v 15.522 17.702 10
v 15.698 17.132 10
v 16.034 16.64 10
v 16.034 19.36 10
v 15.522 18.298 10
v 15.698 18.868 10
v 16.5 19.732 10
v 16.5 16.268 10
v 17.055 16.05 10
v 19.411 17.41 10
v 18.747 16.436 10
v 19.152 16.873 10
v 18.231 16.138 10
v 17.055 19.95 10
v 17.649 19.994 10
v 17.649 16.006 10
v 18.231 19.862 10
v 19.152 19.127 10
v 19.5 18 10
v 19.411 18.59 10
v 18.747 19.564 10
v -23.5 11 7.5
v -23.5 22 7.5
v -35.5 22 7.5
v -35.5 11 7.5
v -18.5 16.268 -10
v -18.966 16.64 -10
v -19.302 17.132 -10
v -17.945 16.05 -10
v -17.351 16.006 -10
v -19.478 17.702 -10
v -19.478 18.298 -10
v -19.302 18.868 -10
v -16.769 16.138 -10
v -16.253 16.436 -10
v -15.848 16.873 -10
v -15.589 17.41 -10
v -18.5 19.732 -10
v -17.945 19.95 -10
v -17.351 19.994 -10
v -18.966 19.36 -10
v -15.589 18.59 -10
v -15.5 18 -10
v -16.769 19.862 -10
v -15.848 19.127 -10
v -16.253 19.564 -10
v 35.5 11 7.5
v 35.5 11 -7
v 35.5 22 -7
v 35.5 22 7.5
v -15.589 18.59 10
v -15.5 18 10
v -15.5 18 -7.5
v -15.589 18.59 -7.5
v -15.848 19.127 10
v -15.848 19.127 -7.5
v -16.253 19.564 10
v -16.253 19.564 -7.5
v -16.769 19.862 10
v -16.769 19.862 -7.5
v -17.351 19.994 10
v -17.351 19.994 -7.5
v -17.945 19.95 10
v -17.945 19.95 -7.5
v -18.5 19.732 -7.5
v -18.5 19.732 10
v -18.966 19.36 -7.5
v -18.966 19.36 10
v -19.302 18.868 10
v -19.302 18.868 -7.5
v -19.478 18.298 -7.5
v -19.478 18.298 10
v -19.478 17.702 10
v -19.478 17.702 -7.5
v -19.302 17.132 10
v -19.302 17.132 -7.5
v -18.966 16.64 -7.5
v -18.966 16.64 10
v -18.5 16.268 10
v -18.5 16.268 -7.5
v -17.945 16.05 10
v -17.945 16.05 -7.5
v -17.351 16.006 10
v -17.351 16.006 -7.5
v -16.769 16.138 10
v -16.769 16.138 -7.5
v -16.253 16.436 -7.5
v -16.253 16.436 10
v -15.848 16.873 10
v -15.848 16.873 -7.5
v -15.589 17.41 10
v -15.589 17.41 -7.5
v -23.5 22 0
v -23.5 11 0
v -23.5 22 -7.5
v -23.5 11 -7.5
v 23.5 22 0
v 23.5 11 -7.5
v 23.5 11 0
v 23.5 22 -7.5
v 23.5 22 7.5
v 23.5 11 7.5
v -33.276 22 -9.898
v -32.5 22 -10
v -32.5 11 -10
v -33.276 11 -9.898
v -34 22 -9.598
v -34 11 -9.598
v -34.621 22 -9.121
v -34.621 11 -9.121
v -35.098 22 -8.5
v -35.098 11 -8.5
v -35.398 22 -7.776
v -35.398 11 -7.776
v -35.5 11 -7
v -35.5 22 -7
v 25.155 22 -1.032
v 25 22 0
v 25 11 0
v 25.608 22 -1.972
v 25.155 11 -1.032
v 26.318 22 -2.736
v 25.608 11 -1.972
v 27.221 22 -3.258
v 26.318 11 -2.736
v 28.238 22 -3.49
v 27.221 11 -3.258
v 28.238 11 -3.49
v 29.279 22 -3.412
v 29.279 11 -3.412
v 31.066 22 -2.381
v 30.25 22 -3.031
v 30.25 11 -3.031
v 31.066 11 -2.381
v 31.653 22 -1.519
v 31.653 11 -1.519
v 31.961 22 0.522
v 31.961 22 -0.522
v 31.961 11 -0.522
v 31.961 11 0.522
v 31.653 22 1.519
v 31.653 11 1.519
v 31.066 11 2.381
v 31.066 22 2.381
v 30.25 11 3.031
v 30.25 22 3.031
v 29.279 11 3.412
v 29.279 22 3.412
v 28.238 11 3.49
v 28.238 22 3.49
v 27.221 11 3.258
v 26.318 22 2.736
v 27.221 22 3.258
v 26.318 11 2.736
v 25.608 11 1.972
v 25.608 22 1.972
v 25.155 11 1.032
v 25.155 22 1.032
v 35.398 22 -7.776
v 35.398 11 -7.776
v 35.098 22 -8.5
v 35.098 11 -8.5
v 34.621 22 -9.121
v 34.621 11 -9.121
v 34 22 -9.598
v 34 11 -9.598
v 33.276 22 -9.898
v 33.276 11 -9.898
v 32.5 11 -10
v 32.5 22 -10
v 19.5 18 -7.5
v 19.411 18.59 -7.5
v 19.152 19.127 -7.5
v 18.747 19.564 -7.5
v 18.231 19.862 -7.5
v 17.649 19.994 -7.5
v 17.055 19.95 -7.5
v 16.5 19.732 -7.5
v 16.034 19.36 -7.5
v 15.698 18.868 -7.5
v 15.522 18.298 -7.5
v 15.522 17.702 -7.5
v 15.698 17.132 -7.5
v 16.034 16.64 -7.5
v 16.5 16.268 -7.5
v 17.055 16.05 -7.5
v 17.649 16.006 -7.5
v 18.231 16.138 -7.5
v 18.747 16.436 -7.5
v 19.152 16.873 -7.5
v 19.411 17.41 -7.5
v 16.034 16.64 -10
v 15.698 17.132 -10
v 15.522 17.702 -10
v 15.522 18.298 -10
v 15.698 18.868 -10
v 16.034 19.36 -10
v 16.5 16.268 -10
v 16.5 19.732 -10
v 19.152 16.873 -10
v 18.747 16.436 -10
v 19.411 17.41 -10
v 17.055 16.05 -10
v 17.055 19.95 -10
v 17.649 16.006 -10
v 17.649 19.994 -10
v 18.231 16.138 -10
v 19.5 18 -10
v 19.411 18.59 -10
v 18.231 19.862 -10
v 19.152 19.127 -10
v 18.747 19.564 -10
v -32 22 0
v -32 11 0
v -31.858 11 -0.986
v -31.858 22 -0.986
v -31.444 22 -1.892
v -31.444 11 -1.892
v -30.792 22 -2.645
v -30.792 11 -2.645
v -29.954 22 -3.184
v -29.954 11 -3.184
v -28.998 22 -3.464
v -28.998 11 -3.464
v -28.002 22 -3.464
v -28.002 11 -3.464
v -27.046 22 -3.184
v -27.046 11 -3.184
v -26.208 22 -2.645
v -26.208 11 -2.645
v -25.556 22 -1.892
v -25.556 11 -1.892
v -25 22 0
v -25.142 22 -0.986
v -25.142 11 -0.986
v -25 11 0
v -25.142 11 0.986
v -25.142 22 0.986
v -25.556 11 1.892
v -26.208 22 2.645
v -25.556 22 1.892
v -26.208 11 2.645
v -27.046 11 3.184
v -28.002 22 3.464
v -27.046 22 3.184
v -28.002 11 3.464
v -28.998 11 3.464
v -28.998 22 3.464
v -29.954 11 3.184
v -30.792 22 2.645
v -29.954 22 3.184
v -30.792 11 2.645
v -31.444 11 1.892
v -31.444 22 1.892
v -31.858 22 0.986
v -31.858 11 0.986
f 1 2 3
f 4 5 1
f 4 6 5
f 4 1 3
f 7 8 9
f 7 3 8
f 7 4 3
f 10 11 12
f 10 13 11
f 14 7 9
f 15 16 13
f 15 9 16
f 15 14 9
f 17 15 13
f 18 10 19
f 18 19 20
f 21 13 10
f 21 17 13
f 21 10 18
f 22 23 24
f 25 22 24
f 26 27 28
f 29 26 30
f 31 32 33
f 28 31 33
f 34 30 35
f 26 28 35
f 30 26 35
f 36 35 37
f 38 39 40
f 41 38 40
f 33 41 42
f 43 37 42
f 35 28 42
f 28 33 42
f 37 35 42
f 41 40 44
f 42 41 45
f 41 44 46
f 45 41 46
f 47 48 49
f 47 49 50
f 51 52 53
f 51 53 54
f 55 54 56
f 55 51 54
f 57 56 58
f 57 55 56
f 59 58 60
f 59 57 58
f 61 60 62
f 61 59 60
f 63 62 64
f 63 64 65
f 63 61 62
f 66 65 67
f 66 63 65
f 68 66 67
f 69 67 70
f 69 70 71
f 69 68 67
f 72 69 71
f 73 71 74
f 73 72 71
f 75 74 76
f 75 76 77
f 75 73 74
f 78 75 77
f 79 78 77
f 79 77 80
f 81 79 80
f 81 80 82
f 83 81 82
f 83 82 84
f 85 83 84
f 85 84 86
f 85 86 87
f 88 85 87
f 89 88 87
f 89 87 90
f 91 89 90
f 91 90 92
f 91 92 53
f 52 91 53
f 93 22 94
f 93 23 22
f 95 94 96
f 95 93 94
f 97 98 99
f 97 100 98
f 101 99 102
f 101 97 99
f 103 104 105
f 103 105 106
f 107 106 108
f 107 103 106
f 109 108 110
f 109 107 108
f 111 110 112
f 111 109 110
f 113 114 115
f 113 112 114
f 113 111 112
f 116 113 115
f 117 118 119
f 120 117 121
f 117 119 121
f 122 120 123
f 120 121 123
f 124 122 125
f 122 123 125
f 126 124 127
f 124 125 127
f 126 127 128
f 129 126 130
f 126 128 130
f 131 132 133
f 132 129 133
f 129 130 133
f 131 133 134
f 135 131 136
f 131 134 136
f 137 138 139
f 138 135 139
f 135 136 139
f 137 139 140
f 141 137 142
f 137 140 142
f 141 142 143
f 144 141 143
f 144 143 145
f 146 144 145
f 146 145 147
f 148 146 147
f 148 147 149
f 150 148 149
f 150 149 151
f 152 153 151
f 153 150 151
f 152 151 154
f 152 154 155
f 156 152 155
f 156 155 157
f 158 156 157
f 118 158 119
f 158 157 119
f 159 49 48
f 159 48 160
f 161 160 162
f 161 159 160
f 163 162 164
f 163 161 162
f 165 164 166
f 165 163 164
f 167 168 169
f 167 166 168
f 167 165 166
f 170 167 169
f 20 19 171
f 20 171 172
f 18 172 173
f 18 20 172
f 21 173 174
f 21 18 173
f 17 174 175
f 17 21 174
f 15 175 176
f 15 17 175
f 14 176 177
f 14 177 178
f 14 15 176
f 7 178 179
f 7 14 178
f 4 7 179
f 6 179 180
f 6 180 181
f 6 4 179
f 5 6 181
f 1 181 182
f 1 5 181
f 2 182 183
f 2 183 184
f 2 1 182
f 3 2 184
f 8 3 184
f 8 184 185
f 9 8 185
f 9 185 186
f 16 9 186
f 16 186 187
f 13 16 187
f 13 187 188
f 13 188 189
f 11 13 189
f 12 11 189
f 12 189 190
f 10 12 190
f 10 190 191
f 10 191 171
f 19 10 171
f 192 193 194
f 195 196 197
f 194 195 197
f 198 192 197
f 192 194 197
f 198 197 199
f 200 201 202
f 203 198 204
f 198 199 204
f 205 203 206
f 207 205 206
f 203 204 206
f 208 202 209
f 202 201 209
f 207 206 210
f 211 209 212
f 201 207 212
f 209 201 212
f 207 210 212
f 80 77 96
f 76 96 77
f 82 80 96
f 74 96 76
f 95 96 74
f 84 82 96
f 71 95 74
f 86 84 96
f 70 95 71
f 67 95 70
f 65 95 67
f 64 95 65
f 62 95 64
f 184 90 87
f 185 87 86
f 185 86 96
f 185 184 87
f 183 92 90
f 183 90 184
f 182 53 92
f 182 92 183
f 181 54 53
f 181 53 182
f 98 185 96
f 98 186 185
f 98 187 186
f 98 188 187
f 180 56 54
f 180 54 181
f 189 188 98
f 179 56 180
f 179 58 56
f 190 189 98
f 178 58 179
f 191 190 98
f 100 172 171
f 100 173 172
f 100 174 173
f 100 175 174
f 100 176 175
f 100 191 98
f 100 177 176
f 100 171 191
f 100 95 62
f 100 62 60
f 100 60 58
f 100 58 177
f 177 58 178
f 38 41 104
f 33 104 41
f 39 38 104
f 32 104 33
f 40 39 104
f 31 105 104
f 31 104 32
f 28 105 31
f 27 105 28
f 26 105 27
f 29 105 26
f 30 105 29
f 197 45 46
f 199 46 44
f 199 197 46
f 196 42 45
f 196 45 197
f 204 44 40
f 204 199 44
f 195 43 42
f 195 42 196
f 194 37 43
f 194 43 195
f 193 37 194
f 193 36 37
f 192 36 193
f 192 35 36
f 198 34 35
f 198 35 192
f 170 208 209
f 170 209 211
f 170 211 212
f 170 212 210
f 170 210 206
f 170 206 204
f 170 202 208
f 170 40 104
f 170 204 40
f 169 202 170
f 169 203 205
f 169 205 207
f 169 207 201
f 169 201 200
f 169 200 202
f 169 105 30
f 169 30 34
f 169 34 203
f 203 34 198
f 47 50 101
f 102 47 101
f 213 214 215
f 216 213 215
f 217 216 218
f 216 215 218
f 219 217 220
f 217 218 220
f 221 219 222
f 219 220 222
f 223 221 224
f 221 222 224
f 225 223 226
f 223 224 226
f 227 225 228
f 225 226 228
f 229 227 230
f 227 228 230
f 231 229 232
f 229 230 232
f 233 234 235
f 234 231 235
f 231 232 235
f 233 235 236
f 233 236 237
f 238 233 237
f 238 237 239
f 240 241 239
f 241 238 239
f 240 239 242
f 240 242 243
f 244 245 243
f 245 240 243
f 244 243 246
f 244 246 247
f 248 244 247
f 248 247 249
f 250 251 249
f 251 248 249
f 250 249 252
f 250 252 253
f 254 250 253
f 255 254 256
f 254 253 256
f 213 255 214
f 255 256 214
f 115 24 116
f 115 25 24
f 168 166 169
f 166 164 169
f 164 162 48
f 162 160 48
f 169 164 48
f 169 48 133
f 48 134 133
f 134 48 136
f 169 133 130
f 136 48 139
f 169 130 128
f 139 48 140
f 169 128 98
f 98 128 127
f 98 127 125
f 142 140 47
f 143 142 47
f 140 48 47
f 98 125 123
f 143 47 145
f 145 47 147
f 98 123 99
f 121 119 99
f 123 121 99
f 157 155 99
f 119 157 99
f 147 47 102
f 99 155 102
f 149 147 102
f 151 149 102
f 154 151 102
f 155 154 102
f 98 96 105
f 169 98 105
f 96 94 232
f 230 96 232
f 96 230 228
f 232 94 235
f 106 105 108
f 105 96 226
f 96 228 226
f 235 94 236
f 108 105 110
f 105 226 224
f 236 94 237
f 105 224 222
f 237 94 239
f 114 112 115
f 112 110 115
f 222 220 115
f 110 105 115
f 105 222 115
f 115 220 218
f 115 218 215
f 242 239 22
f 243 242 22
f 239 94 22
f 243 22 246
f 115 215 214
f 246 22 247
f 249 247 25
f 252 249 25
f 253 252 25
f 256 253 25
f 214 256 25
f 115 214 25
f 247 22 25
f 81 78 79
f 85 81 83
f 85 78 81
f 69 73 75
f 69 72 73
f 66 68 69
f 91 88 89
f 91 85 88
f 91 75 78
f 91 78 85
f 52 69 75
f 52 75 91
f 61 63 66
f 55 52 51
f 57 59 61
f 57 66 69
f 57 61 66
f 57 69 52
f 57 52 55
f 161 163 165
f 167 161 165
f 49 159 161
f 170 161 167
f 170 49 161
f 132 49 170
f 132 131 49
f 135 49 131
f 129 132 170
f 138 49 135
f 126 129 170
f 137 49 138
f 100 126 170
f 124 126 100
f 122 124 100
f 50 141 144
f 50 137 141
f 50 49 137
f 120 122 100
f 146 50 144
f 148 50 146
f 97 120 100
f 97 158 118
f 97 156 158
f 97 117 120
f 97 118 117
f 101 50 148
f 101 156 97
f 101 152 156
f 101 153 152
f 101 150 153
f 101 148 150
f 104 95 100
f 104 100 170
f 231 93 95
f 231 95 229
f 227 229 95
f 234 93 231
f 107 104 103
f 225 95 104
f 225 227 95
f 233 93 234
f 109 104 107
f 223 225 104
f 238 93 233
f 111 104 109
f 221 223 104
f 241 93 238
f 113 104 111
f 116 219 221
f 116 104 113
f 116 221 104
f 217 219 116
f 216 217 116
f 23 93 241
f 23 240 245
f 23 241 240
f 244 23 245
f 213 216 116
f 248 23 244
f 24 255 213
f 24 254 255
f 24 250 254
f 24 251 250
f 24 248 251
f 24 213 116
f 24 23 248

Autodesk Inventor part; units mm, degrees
ref_plane "YZ Plane" through (0, 0, 0) normal (1, 0, 0) x (0, 1, 0)
ref_plane "XZ Plane" through (0, 0, 0) normal (0, 1, 0) x (-1, 0, 0)
ref_plane "XY Plane" through (0, 0, 0) normal (0, 0, 1) x (1, 0, 0)
sketch "Esquisse1" plane through (0, 0, 0) normal (0, 1, 0) x (-1, 0, 0)
  circle A0 centre (-28.5, 0) radius 3.5
  circle A1 centre (28.5, 0) radius 3.5
  line L0 (-35.5, 10) -> (35.5, 10)
  line L1 (35.5, 10) -> (35.5, -10)
  line L2 (35.5, -10) -> (-35.5, -10)
  line L3 (-35.5, -10) -> (-35.5, 10)
  line L4 (-28.5, 0) -> (28.5, 0)
  point P0 (0, 0)
  dimension "d0" = 7
  dimension "d1" = 7
  dimension "d2" = 28.5
  dimension "d3" = 28.5
  dimension "d4" = 20
  dimension "d5" = 10
  dimension "d6" = 7
  dimension "d7" = 7
extrude "Extrusion1" add sketch "Esquisse1" along normal blind 22
sketch "Esquisse2" plane through (0, 22, 0) normal (0, 1, 0) x (1, 0, 0)
  circle A0 centre (-28.5, 0) radius 3.5 projected
  circle A1 centre (28.5, 0) radius 3.5 projected
  line L0 (-23.5, 7.5) -> (23.5, 7.5)
  line L1 (23.5, 7.5) -> (23.5, -7.5)
  line L2 (23.5, -7.5) -> (-23.5, -7.5)
  line L3 (-23.5, -7.5) -> (-23.5, 7.5)
  point P0 (0, 0)
  dimension "d10" = 15
  dimension "d11" = 7.5
  dimension "d12" = 5
  dimension "d13" = 5
extrude "Extrusion2" cut sketch "Esquisse2" against normal through all contours L0 L1 L2 L3
sketch "Esquisse3" plane through (-35.5, 0, 10) normal (0, 0, 1) x (1, 0, 0)
  line L0 (71, 0) -> (0, 0) projected
  line L1 (71, 0) -> (71, 22) projected
  line L2 (0, 22) -> (71, 22) projected
  line L3 (0, 0) -> (0, 22) projected
  line L4 (14, 22) -> (57, 22)
  line L5 (57, 22) -> (57, 0)
  line L6 (57, 0) -> (14, 0)
  line L7 (14, 0) -> (14, 22)
  line L8 (14, 22) -> (22, 22)
  line L9 (22, 22) -> (22, 14)
  line L10 (22, 14) -> (14, 14)
  line L11 (14, 14) -> (14, 22)
  line L12 (57, 22) -> (49, 22)
  line L13 (49, 22) -> (49, 14)
  line L14 (49, 14) -> (57, 14)
  line L15 (57, 14) -> (57, 22)
  line L16 (14, 22) -> (22, 14)
  line L17 (22, 22) -> (14, 14)
  line L18 (49, 14) -> (57, 22)
  line L19 (49, 22) -> (57, 14)
  circle A0 centre (18, 18) radius 2
  circle A1 centre (53, 18) radius 2
  point P0 (35.5, 0)
  dimension "d16" = 14
  dimension "d17" = 14
  dimension "d18" = 8
  dimension "d19" = 8
  dimension "d20" = 8
  dimension "d21" = 8
  dimension "d22" = 4
  dimension "d23" = 4
sketch "Esquisse4" plane through (35.5, 0, 10) normal (1, 0, 0) x (0, 0, -1)
  line L0 (20, 0) -> (0, 0) projected
  line L1 (0, 22) -> (20, 22) projected
  line L2 (7, 22) -> (13, 22)
  line L3 (13, 22) -> (13, 0)
  line L4 (13, 0) -> (7, 0)
  line L5 (7, 0) -> (7, 22)
  circle A0 centre (3.5, 7.5) radius 1.5
  circle A1 centre (16.5, 7.5) radius 1.5
  line L6 (20, 0) -> (20, 22) projected
  line L7 (0, 0) -> (7, 0)
  line L8 (7, 0) -> (7, 15)
  line L9 (7, 15) -> (0, 15)
  line L10 (0, 15) -> (0, 0)
  line L11 (13, 0) -> (20, 0)
  line L12 (20, 0) -> (20, 15)
  line L13 (20, 15) -> (13, 15)
  line L14 (13, 15) -> (13, 0)
  line L15 (0, 15) -> (7, 0)
  line L16 (7, 15) -> (0, 0)
  line L17 (13, 15) -> (20, 0)
  line L18 (20, 15) -> (13, 0)
  point P0 (10, 0)
  dimension "d26" = 6
  dimension "d27" = 3
  dimension "d28" = 3
  dimension "d29" = 3
  dimension "d32" = 15
extrude "Extrusion4" cut sketch "Esquisse4" against normal through all contours L17 L18 A1 | A1 L18 L17 | A1 L17 L18 | L18 L17 A1 | L15 L16 A0 | A0 L16 L15 | A0 L15 L16 | L16 L15 A0
sketch "Esquisse5" plane through (-35.5, 0, 10) normal (0, 0, 1) x (1, 0, 0)
  line L0 (71, 0) -> (0, 0) projected
  line L1 (71, 0) -> (71, 22) projected
  line L2 (0, 0) -> (71, 0)
  line L3 (71, 0) -> (71, 11)
  line L4 (71, 11) -> (0, 11)
  line L5 (0, 11) -> (0, 0)
  point P0 (35.5, 0)
  dimension "d33" = 11
extrude "Extrusion5" cut sketch "Esquisse5" against normal through all
sketch "Esquisse6" plane through (0, 22, 0) normal (0, 1, 0) x (1, 0, 0)
  line L0 (23.5, 7.5) -> (23.5, -7.5) projected
  line L1 (-35.5, -10) -> (35.5, -10) projected
  line L2 (-23.5, -7.5) -> (23.5, -7.5)
  line L3 (23.5, -7.5) -> (23.5, -10)
  line L4 (23.5, -10) -> (-23.5, -10)
  line L5 (-23.5, -10) -> (-23.5, -7.5)
  line L6 (-35.5, -10) -> (-23.5, -10)
  line L7 (-23.5, -10) -> (-23.5, -7.5)
  line L8 (-23.5, -7.5) -> (-35.5, -7.5)
  line L9 (-35.5, -7.5) -> (-35.5, -10)
  line L10 (35.5, -10) -> (23.5, -10)
  line L11 (23.5, -10) -> (23.5, -7.5)
  line L12 (23.5, -7.5) -> (35.5, -7.5)
  line L13 (35.5, -7.5) -> (35.5, -10)
  point P0 (0, 0)
extrude "Extrusion6" cut sketch "Esquisse6" against normal through all
extrude "Extrusion8" add sketch "Esquisse3" against normal through all contours A1 L18 L19 | L19 L18 A1 | L18 L19 A1 | A0 L16 L17 | L17 L16 A0 | A1 L19 L18 | A0 L17 L16 | L16 L17 A0
fillet "Congé1" radius 3 2 edges at (35.5, 16.5, -10) (-35.5, 16.5, -10)
equation "\"d3\" = d2"
equation "\"d5\" = 0.5 * d4"
equation "\"d11\" = 0.5 * d10"
equation "\"d17\" = d16"
equation "\"d27\" = 0.5 * d26"
properties part number "tendeur_base_up"
